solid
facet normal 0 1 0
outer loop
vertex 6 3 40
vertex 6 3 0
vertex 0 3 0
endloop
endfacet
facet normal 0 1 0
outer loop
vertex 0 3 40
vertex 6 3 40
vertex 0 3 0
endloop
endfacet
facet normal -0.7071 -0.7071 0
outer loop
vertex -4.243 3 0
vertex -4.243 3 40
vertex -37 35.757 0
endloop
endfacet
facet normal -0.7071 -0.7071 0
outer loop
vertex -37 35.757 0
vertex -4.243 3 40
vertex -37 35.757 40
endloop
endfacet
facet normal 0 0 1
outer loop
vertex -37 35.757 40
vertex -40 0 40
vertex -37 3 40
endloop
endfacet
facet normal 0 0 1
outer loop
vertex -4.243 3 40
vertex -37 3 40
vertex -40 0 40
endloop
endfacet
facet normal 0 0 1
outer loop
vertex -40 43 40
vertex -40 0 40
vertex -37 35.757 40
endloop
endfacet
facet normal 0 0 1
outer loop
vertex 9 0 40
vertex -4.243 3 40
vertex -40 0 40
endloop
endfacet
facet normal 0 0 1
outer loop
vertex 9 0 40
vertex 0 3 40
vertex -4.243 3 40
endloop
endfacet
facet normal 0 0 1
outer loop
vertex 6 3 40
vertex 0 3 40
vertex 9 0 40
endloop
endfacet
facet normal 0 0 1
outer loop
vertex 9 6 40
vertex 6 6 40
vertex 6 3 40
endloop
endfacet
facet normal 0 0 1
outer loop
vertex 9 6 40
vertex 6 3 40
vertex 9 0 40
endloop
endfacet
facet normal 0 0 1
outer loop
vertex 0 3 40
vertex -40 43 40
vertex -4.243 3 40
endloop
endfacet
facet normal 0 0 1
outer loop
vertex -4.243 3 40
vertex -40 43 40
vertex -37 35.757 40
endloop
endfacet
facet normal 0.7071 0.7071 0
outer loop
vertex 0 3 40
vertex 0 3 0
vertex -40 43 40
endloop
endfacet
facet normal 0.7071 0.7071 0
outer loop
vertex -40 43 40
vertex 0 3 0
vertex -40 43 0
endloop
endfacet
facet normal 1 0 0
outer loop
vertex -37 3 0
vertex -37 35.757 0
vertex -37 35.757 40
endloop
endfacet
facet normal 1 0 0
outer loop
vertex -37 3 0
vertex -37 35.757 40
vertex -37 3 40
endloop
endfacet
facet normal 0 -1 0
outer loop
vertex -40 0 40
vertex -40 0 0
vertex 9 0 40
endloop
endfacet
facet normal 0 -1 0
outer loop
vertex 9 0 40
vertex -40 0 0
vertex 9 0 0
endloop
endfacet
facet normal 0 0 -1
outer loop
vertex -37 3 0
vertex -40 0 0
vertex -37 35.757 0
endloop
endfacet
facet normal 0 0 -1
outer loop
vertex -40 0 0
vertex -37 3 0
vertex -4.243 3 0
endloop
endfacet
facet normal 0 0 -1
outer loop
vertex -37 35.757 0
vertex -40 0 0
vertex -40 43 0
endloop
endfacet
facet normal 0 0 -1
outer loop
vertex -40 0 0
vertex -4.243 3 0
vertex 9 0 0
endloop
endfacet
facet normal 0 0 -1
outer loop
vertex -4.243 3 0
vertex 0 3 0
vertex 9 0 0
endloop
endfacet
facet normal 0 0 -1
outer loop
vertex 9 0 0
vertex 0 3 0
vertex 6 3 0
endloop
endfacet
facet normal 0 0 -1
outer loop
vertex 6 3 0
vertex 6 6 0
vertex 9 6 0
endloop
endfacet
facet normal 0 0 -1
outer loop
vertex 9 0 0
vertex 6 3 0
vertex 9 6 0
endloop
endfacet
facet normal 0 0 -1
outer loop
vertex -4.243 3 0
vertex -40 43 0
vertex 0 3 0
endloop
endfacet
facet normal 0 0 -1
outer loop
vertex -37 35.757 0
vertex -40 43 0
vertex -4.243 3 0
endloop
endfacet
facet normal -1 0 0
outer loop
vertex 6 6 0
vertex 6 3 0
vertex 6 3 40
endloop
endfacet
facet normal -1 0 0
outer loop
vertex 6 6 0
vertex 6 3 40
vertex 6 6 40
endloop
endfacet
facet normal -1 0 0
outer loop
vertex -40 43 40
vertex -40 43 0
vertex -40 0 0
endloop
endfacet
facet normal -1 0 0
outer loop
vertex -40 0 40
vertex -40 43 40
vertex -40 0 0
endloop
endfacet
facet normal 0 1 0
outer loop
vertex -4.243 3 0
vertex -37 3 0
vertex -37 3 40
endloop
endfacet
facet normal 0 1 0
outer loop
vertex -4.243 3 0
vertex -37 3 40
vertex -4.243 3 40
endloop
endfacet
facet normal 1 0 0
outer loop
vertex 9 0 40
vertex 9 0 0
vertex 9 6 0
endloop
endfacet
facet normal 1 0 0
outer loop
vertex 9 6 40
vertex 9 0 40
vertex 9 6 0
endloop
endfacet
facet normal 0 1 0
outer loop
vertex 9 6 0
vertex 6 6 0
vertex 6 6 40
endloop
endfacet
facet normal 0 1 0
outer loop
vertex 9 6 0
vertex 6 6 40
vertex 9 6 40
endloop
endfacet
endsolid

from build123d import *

# Parameters (mm, degrees)
F0_W     = 40
F0_H     = 3
F0_W_2   = 3
F1_DEPTH = 40
F4_DEPTH = 40.001


with BuildPart() as f1:
    # F0 (on Top) → F1 (new body)
    with BuildSketch(Plane.XY):
        with Locations((-20, 1.5)):
            Rectangle(F0_W, F0_H)
        Polygon((0, 3), (0, 0), (9, 0), (9, 3), (6, 3), align=None)
        Polygon((-40, 3), (0, 3), (-40, 43), align=None)
        with Locations((7.5, 4.5)):
            Rectangle(F0_W_2, F0_H)
    extrude(amount=F1_DEPTH)

    # F3 (on face) → F4 (cut, through all)
    with BuildSketch(Plane.XY.offset(40)):
        Polygon((-4.242641, 3), (-37, 35.757359), (-37, 3), align=None)
    extrude(amount=-F4_DEPTH, mode=Mode.SUBTRACT)


solid = f1.part
